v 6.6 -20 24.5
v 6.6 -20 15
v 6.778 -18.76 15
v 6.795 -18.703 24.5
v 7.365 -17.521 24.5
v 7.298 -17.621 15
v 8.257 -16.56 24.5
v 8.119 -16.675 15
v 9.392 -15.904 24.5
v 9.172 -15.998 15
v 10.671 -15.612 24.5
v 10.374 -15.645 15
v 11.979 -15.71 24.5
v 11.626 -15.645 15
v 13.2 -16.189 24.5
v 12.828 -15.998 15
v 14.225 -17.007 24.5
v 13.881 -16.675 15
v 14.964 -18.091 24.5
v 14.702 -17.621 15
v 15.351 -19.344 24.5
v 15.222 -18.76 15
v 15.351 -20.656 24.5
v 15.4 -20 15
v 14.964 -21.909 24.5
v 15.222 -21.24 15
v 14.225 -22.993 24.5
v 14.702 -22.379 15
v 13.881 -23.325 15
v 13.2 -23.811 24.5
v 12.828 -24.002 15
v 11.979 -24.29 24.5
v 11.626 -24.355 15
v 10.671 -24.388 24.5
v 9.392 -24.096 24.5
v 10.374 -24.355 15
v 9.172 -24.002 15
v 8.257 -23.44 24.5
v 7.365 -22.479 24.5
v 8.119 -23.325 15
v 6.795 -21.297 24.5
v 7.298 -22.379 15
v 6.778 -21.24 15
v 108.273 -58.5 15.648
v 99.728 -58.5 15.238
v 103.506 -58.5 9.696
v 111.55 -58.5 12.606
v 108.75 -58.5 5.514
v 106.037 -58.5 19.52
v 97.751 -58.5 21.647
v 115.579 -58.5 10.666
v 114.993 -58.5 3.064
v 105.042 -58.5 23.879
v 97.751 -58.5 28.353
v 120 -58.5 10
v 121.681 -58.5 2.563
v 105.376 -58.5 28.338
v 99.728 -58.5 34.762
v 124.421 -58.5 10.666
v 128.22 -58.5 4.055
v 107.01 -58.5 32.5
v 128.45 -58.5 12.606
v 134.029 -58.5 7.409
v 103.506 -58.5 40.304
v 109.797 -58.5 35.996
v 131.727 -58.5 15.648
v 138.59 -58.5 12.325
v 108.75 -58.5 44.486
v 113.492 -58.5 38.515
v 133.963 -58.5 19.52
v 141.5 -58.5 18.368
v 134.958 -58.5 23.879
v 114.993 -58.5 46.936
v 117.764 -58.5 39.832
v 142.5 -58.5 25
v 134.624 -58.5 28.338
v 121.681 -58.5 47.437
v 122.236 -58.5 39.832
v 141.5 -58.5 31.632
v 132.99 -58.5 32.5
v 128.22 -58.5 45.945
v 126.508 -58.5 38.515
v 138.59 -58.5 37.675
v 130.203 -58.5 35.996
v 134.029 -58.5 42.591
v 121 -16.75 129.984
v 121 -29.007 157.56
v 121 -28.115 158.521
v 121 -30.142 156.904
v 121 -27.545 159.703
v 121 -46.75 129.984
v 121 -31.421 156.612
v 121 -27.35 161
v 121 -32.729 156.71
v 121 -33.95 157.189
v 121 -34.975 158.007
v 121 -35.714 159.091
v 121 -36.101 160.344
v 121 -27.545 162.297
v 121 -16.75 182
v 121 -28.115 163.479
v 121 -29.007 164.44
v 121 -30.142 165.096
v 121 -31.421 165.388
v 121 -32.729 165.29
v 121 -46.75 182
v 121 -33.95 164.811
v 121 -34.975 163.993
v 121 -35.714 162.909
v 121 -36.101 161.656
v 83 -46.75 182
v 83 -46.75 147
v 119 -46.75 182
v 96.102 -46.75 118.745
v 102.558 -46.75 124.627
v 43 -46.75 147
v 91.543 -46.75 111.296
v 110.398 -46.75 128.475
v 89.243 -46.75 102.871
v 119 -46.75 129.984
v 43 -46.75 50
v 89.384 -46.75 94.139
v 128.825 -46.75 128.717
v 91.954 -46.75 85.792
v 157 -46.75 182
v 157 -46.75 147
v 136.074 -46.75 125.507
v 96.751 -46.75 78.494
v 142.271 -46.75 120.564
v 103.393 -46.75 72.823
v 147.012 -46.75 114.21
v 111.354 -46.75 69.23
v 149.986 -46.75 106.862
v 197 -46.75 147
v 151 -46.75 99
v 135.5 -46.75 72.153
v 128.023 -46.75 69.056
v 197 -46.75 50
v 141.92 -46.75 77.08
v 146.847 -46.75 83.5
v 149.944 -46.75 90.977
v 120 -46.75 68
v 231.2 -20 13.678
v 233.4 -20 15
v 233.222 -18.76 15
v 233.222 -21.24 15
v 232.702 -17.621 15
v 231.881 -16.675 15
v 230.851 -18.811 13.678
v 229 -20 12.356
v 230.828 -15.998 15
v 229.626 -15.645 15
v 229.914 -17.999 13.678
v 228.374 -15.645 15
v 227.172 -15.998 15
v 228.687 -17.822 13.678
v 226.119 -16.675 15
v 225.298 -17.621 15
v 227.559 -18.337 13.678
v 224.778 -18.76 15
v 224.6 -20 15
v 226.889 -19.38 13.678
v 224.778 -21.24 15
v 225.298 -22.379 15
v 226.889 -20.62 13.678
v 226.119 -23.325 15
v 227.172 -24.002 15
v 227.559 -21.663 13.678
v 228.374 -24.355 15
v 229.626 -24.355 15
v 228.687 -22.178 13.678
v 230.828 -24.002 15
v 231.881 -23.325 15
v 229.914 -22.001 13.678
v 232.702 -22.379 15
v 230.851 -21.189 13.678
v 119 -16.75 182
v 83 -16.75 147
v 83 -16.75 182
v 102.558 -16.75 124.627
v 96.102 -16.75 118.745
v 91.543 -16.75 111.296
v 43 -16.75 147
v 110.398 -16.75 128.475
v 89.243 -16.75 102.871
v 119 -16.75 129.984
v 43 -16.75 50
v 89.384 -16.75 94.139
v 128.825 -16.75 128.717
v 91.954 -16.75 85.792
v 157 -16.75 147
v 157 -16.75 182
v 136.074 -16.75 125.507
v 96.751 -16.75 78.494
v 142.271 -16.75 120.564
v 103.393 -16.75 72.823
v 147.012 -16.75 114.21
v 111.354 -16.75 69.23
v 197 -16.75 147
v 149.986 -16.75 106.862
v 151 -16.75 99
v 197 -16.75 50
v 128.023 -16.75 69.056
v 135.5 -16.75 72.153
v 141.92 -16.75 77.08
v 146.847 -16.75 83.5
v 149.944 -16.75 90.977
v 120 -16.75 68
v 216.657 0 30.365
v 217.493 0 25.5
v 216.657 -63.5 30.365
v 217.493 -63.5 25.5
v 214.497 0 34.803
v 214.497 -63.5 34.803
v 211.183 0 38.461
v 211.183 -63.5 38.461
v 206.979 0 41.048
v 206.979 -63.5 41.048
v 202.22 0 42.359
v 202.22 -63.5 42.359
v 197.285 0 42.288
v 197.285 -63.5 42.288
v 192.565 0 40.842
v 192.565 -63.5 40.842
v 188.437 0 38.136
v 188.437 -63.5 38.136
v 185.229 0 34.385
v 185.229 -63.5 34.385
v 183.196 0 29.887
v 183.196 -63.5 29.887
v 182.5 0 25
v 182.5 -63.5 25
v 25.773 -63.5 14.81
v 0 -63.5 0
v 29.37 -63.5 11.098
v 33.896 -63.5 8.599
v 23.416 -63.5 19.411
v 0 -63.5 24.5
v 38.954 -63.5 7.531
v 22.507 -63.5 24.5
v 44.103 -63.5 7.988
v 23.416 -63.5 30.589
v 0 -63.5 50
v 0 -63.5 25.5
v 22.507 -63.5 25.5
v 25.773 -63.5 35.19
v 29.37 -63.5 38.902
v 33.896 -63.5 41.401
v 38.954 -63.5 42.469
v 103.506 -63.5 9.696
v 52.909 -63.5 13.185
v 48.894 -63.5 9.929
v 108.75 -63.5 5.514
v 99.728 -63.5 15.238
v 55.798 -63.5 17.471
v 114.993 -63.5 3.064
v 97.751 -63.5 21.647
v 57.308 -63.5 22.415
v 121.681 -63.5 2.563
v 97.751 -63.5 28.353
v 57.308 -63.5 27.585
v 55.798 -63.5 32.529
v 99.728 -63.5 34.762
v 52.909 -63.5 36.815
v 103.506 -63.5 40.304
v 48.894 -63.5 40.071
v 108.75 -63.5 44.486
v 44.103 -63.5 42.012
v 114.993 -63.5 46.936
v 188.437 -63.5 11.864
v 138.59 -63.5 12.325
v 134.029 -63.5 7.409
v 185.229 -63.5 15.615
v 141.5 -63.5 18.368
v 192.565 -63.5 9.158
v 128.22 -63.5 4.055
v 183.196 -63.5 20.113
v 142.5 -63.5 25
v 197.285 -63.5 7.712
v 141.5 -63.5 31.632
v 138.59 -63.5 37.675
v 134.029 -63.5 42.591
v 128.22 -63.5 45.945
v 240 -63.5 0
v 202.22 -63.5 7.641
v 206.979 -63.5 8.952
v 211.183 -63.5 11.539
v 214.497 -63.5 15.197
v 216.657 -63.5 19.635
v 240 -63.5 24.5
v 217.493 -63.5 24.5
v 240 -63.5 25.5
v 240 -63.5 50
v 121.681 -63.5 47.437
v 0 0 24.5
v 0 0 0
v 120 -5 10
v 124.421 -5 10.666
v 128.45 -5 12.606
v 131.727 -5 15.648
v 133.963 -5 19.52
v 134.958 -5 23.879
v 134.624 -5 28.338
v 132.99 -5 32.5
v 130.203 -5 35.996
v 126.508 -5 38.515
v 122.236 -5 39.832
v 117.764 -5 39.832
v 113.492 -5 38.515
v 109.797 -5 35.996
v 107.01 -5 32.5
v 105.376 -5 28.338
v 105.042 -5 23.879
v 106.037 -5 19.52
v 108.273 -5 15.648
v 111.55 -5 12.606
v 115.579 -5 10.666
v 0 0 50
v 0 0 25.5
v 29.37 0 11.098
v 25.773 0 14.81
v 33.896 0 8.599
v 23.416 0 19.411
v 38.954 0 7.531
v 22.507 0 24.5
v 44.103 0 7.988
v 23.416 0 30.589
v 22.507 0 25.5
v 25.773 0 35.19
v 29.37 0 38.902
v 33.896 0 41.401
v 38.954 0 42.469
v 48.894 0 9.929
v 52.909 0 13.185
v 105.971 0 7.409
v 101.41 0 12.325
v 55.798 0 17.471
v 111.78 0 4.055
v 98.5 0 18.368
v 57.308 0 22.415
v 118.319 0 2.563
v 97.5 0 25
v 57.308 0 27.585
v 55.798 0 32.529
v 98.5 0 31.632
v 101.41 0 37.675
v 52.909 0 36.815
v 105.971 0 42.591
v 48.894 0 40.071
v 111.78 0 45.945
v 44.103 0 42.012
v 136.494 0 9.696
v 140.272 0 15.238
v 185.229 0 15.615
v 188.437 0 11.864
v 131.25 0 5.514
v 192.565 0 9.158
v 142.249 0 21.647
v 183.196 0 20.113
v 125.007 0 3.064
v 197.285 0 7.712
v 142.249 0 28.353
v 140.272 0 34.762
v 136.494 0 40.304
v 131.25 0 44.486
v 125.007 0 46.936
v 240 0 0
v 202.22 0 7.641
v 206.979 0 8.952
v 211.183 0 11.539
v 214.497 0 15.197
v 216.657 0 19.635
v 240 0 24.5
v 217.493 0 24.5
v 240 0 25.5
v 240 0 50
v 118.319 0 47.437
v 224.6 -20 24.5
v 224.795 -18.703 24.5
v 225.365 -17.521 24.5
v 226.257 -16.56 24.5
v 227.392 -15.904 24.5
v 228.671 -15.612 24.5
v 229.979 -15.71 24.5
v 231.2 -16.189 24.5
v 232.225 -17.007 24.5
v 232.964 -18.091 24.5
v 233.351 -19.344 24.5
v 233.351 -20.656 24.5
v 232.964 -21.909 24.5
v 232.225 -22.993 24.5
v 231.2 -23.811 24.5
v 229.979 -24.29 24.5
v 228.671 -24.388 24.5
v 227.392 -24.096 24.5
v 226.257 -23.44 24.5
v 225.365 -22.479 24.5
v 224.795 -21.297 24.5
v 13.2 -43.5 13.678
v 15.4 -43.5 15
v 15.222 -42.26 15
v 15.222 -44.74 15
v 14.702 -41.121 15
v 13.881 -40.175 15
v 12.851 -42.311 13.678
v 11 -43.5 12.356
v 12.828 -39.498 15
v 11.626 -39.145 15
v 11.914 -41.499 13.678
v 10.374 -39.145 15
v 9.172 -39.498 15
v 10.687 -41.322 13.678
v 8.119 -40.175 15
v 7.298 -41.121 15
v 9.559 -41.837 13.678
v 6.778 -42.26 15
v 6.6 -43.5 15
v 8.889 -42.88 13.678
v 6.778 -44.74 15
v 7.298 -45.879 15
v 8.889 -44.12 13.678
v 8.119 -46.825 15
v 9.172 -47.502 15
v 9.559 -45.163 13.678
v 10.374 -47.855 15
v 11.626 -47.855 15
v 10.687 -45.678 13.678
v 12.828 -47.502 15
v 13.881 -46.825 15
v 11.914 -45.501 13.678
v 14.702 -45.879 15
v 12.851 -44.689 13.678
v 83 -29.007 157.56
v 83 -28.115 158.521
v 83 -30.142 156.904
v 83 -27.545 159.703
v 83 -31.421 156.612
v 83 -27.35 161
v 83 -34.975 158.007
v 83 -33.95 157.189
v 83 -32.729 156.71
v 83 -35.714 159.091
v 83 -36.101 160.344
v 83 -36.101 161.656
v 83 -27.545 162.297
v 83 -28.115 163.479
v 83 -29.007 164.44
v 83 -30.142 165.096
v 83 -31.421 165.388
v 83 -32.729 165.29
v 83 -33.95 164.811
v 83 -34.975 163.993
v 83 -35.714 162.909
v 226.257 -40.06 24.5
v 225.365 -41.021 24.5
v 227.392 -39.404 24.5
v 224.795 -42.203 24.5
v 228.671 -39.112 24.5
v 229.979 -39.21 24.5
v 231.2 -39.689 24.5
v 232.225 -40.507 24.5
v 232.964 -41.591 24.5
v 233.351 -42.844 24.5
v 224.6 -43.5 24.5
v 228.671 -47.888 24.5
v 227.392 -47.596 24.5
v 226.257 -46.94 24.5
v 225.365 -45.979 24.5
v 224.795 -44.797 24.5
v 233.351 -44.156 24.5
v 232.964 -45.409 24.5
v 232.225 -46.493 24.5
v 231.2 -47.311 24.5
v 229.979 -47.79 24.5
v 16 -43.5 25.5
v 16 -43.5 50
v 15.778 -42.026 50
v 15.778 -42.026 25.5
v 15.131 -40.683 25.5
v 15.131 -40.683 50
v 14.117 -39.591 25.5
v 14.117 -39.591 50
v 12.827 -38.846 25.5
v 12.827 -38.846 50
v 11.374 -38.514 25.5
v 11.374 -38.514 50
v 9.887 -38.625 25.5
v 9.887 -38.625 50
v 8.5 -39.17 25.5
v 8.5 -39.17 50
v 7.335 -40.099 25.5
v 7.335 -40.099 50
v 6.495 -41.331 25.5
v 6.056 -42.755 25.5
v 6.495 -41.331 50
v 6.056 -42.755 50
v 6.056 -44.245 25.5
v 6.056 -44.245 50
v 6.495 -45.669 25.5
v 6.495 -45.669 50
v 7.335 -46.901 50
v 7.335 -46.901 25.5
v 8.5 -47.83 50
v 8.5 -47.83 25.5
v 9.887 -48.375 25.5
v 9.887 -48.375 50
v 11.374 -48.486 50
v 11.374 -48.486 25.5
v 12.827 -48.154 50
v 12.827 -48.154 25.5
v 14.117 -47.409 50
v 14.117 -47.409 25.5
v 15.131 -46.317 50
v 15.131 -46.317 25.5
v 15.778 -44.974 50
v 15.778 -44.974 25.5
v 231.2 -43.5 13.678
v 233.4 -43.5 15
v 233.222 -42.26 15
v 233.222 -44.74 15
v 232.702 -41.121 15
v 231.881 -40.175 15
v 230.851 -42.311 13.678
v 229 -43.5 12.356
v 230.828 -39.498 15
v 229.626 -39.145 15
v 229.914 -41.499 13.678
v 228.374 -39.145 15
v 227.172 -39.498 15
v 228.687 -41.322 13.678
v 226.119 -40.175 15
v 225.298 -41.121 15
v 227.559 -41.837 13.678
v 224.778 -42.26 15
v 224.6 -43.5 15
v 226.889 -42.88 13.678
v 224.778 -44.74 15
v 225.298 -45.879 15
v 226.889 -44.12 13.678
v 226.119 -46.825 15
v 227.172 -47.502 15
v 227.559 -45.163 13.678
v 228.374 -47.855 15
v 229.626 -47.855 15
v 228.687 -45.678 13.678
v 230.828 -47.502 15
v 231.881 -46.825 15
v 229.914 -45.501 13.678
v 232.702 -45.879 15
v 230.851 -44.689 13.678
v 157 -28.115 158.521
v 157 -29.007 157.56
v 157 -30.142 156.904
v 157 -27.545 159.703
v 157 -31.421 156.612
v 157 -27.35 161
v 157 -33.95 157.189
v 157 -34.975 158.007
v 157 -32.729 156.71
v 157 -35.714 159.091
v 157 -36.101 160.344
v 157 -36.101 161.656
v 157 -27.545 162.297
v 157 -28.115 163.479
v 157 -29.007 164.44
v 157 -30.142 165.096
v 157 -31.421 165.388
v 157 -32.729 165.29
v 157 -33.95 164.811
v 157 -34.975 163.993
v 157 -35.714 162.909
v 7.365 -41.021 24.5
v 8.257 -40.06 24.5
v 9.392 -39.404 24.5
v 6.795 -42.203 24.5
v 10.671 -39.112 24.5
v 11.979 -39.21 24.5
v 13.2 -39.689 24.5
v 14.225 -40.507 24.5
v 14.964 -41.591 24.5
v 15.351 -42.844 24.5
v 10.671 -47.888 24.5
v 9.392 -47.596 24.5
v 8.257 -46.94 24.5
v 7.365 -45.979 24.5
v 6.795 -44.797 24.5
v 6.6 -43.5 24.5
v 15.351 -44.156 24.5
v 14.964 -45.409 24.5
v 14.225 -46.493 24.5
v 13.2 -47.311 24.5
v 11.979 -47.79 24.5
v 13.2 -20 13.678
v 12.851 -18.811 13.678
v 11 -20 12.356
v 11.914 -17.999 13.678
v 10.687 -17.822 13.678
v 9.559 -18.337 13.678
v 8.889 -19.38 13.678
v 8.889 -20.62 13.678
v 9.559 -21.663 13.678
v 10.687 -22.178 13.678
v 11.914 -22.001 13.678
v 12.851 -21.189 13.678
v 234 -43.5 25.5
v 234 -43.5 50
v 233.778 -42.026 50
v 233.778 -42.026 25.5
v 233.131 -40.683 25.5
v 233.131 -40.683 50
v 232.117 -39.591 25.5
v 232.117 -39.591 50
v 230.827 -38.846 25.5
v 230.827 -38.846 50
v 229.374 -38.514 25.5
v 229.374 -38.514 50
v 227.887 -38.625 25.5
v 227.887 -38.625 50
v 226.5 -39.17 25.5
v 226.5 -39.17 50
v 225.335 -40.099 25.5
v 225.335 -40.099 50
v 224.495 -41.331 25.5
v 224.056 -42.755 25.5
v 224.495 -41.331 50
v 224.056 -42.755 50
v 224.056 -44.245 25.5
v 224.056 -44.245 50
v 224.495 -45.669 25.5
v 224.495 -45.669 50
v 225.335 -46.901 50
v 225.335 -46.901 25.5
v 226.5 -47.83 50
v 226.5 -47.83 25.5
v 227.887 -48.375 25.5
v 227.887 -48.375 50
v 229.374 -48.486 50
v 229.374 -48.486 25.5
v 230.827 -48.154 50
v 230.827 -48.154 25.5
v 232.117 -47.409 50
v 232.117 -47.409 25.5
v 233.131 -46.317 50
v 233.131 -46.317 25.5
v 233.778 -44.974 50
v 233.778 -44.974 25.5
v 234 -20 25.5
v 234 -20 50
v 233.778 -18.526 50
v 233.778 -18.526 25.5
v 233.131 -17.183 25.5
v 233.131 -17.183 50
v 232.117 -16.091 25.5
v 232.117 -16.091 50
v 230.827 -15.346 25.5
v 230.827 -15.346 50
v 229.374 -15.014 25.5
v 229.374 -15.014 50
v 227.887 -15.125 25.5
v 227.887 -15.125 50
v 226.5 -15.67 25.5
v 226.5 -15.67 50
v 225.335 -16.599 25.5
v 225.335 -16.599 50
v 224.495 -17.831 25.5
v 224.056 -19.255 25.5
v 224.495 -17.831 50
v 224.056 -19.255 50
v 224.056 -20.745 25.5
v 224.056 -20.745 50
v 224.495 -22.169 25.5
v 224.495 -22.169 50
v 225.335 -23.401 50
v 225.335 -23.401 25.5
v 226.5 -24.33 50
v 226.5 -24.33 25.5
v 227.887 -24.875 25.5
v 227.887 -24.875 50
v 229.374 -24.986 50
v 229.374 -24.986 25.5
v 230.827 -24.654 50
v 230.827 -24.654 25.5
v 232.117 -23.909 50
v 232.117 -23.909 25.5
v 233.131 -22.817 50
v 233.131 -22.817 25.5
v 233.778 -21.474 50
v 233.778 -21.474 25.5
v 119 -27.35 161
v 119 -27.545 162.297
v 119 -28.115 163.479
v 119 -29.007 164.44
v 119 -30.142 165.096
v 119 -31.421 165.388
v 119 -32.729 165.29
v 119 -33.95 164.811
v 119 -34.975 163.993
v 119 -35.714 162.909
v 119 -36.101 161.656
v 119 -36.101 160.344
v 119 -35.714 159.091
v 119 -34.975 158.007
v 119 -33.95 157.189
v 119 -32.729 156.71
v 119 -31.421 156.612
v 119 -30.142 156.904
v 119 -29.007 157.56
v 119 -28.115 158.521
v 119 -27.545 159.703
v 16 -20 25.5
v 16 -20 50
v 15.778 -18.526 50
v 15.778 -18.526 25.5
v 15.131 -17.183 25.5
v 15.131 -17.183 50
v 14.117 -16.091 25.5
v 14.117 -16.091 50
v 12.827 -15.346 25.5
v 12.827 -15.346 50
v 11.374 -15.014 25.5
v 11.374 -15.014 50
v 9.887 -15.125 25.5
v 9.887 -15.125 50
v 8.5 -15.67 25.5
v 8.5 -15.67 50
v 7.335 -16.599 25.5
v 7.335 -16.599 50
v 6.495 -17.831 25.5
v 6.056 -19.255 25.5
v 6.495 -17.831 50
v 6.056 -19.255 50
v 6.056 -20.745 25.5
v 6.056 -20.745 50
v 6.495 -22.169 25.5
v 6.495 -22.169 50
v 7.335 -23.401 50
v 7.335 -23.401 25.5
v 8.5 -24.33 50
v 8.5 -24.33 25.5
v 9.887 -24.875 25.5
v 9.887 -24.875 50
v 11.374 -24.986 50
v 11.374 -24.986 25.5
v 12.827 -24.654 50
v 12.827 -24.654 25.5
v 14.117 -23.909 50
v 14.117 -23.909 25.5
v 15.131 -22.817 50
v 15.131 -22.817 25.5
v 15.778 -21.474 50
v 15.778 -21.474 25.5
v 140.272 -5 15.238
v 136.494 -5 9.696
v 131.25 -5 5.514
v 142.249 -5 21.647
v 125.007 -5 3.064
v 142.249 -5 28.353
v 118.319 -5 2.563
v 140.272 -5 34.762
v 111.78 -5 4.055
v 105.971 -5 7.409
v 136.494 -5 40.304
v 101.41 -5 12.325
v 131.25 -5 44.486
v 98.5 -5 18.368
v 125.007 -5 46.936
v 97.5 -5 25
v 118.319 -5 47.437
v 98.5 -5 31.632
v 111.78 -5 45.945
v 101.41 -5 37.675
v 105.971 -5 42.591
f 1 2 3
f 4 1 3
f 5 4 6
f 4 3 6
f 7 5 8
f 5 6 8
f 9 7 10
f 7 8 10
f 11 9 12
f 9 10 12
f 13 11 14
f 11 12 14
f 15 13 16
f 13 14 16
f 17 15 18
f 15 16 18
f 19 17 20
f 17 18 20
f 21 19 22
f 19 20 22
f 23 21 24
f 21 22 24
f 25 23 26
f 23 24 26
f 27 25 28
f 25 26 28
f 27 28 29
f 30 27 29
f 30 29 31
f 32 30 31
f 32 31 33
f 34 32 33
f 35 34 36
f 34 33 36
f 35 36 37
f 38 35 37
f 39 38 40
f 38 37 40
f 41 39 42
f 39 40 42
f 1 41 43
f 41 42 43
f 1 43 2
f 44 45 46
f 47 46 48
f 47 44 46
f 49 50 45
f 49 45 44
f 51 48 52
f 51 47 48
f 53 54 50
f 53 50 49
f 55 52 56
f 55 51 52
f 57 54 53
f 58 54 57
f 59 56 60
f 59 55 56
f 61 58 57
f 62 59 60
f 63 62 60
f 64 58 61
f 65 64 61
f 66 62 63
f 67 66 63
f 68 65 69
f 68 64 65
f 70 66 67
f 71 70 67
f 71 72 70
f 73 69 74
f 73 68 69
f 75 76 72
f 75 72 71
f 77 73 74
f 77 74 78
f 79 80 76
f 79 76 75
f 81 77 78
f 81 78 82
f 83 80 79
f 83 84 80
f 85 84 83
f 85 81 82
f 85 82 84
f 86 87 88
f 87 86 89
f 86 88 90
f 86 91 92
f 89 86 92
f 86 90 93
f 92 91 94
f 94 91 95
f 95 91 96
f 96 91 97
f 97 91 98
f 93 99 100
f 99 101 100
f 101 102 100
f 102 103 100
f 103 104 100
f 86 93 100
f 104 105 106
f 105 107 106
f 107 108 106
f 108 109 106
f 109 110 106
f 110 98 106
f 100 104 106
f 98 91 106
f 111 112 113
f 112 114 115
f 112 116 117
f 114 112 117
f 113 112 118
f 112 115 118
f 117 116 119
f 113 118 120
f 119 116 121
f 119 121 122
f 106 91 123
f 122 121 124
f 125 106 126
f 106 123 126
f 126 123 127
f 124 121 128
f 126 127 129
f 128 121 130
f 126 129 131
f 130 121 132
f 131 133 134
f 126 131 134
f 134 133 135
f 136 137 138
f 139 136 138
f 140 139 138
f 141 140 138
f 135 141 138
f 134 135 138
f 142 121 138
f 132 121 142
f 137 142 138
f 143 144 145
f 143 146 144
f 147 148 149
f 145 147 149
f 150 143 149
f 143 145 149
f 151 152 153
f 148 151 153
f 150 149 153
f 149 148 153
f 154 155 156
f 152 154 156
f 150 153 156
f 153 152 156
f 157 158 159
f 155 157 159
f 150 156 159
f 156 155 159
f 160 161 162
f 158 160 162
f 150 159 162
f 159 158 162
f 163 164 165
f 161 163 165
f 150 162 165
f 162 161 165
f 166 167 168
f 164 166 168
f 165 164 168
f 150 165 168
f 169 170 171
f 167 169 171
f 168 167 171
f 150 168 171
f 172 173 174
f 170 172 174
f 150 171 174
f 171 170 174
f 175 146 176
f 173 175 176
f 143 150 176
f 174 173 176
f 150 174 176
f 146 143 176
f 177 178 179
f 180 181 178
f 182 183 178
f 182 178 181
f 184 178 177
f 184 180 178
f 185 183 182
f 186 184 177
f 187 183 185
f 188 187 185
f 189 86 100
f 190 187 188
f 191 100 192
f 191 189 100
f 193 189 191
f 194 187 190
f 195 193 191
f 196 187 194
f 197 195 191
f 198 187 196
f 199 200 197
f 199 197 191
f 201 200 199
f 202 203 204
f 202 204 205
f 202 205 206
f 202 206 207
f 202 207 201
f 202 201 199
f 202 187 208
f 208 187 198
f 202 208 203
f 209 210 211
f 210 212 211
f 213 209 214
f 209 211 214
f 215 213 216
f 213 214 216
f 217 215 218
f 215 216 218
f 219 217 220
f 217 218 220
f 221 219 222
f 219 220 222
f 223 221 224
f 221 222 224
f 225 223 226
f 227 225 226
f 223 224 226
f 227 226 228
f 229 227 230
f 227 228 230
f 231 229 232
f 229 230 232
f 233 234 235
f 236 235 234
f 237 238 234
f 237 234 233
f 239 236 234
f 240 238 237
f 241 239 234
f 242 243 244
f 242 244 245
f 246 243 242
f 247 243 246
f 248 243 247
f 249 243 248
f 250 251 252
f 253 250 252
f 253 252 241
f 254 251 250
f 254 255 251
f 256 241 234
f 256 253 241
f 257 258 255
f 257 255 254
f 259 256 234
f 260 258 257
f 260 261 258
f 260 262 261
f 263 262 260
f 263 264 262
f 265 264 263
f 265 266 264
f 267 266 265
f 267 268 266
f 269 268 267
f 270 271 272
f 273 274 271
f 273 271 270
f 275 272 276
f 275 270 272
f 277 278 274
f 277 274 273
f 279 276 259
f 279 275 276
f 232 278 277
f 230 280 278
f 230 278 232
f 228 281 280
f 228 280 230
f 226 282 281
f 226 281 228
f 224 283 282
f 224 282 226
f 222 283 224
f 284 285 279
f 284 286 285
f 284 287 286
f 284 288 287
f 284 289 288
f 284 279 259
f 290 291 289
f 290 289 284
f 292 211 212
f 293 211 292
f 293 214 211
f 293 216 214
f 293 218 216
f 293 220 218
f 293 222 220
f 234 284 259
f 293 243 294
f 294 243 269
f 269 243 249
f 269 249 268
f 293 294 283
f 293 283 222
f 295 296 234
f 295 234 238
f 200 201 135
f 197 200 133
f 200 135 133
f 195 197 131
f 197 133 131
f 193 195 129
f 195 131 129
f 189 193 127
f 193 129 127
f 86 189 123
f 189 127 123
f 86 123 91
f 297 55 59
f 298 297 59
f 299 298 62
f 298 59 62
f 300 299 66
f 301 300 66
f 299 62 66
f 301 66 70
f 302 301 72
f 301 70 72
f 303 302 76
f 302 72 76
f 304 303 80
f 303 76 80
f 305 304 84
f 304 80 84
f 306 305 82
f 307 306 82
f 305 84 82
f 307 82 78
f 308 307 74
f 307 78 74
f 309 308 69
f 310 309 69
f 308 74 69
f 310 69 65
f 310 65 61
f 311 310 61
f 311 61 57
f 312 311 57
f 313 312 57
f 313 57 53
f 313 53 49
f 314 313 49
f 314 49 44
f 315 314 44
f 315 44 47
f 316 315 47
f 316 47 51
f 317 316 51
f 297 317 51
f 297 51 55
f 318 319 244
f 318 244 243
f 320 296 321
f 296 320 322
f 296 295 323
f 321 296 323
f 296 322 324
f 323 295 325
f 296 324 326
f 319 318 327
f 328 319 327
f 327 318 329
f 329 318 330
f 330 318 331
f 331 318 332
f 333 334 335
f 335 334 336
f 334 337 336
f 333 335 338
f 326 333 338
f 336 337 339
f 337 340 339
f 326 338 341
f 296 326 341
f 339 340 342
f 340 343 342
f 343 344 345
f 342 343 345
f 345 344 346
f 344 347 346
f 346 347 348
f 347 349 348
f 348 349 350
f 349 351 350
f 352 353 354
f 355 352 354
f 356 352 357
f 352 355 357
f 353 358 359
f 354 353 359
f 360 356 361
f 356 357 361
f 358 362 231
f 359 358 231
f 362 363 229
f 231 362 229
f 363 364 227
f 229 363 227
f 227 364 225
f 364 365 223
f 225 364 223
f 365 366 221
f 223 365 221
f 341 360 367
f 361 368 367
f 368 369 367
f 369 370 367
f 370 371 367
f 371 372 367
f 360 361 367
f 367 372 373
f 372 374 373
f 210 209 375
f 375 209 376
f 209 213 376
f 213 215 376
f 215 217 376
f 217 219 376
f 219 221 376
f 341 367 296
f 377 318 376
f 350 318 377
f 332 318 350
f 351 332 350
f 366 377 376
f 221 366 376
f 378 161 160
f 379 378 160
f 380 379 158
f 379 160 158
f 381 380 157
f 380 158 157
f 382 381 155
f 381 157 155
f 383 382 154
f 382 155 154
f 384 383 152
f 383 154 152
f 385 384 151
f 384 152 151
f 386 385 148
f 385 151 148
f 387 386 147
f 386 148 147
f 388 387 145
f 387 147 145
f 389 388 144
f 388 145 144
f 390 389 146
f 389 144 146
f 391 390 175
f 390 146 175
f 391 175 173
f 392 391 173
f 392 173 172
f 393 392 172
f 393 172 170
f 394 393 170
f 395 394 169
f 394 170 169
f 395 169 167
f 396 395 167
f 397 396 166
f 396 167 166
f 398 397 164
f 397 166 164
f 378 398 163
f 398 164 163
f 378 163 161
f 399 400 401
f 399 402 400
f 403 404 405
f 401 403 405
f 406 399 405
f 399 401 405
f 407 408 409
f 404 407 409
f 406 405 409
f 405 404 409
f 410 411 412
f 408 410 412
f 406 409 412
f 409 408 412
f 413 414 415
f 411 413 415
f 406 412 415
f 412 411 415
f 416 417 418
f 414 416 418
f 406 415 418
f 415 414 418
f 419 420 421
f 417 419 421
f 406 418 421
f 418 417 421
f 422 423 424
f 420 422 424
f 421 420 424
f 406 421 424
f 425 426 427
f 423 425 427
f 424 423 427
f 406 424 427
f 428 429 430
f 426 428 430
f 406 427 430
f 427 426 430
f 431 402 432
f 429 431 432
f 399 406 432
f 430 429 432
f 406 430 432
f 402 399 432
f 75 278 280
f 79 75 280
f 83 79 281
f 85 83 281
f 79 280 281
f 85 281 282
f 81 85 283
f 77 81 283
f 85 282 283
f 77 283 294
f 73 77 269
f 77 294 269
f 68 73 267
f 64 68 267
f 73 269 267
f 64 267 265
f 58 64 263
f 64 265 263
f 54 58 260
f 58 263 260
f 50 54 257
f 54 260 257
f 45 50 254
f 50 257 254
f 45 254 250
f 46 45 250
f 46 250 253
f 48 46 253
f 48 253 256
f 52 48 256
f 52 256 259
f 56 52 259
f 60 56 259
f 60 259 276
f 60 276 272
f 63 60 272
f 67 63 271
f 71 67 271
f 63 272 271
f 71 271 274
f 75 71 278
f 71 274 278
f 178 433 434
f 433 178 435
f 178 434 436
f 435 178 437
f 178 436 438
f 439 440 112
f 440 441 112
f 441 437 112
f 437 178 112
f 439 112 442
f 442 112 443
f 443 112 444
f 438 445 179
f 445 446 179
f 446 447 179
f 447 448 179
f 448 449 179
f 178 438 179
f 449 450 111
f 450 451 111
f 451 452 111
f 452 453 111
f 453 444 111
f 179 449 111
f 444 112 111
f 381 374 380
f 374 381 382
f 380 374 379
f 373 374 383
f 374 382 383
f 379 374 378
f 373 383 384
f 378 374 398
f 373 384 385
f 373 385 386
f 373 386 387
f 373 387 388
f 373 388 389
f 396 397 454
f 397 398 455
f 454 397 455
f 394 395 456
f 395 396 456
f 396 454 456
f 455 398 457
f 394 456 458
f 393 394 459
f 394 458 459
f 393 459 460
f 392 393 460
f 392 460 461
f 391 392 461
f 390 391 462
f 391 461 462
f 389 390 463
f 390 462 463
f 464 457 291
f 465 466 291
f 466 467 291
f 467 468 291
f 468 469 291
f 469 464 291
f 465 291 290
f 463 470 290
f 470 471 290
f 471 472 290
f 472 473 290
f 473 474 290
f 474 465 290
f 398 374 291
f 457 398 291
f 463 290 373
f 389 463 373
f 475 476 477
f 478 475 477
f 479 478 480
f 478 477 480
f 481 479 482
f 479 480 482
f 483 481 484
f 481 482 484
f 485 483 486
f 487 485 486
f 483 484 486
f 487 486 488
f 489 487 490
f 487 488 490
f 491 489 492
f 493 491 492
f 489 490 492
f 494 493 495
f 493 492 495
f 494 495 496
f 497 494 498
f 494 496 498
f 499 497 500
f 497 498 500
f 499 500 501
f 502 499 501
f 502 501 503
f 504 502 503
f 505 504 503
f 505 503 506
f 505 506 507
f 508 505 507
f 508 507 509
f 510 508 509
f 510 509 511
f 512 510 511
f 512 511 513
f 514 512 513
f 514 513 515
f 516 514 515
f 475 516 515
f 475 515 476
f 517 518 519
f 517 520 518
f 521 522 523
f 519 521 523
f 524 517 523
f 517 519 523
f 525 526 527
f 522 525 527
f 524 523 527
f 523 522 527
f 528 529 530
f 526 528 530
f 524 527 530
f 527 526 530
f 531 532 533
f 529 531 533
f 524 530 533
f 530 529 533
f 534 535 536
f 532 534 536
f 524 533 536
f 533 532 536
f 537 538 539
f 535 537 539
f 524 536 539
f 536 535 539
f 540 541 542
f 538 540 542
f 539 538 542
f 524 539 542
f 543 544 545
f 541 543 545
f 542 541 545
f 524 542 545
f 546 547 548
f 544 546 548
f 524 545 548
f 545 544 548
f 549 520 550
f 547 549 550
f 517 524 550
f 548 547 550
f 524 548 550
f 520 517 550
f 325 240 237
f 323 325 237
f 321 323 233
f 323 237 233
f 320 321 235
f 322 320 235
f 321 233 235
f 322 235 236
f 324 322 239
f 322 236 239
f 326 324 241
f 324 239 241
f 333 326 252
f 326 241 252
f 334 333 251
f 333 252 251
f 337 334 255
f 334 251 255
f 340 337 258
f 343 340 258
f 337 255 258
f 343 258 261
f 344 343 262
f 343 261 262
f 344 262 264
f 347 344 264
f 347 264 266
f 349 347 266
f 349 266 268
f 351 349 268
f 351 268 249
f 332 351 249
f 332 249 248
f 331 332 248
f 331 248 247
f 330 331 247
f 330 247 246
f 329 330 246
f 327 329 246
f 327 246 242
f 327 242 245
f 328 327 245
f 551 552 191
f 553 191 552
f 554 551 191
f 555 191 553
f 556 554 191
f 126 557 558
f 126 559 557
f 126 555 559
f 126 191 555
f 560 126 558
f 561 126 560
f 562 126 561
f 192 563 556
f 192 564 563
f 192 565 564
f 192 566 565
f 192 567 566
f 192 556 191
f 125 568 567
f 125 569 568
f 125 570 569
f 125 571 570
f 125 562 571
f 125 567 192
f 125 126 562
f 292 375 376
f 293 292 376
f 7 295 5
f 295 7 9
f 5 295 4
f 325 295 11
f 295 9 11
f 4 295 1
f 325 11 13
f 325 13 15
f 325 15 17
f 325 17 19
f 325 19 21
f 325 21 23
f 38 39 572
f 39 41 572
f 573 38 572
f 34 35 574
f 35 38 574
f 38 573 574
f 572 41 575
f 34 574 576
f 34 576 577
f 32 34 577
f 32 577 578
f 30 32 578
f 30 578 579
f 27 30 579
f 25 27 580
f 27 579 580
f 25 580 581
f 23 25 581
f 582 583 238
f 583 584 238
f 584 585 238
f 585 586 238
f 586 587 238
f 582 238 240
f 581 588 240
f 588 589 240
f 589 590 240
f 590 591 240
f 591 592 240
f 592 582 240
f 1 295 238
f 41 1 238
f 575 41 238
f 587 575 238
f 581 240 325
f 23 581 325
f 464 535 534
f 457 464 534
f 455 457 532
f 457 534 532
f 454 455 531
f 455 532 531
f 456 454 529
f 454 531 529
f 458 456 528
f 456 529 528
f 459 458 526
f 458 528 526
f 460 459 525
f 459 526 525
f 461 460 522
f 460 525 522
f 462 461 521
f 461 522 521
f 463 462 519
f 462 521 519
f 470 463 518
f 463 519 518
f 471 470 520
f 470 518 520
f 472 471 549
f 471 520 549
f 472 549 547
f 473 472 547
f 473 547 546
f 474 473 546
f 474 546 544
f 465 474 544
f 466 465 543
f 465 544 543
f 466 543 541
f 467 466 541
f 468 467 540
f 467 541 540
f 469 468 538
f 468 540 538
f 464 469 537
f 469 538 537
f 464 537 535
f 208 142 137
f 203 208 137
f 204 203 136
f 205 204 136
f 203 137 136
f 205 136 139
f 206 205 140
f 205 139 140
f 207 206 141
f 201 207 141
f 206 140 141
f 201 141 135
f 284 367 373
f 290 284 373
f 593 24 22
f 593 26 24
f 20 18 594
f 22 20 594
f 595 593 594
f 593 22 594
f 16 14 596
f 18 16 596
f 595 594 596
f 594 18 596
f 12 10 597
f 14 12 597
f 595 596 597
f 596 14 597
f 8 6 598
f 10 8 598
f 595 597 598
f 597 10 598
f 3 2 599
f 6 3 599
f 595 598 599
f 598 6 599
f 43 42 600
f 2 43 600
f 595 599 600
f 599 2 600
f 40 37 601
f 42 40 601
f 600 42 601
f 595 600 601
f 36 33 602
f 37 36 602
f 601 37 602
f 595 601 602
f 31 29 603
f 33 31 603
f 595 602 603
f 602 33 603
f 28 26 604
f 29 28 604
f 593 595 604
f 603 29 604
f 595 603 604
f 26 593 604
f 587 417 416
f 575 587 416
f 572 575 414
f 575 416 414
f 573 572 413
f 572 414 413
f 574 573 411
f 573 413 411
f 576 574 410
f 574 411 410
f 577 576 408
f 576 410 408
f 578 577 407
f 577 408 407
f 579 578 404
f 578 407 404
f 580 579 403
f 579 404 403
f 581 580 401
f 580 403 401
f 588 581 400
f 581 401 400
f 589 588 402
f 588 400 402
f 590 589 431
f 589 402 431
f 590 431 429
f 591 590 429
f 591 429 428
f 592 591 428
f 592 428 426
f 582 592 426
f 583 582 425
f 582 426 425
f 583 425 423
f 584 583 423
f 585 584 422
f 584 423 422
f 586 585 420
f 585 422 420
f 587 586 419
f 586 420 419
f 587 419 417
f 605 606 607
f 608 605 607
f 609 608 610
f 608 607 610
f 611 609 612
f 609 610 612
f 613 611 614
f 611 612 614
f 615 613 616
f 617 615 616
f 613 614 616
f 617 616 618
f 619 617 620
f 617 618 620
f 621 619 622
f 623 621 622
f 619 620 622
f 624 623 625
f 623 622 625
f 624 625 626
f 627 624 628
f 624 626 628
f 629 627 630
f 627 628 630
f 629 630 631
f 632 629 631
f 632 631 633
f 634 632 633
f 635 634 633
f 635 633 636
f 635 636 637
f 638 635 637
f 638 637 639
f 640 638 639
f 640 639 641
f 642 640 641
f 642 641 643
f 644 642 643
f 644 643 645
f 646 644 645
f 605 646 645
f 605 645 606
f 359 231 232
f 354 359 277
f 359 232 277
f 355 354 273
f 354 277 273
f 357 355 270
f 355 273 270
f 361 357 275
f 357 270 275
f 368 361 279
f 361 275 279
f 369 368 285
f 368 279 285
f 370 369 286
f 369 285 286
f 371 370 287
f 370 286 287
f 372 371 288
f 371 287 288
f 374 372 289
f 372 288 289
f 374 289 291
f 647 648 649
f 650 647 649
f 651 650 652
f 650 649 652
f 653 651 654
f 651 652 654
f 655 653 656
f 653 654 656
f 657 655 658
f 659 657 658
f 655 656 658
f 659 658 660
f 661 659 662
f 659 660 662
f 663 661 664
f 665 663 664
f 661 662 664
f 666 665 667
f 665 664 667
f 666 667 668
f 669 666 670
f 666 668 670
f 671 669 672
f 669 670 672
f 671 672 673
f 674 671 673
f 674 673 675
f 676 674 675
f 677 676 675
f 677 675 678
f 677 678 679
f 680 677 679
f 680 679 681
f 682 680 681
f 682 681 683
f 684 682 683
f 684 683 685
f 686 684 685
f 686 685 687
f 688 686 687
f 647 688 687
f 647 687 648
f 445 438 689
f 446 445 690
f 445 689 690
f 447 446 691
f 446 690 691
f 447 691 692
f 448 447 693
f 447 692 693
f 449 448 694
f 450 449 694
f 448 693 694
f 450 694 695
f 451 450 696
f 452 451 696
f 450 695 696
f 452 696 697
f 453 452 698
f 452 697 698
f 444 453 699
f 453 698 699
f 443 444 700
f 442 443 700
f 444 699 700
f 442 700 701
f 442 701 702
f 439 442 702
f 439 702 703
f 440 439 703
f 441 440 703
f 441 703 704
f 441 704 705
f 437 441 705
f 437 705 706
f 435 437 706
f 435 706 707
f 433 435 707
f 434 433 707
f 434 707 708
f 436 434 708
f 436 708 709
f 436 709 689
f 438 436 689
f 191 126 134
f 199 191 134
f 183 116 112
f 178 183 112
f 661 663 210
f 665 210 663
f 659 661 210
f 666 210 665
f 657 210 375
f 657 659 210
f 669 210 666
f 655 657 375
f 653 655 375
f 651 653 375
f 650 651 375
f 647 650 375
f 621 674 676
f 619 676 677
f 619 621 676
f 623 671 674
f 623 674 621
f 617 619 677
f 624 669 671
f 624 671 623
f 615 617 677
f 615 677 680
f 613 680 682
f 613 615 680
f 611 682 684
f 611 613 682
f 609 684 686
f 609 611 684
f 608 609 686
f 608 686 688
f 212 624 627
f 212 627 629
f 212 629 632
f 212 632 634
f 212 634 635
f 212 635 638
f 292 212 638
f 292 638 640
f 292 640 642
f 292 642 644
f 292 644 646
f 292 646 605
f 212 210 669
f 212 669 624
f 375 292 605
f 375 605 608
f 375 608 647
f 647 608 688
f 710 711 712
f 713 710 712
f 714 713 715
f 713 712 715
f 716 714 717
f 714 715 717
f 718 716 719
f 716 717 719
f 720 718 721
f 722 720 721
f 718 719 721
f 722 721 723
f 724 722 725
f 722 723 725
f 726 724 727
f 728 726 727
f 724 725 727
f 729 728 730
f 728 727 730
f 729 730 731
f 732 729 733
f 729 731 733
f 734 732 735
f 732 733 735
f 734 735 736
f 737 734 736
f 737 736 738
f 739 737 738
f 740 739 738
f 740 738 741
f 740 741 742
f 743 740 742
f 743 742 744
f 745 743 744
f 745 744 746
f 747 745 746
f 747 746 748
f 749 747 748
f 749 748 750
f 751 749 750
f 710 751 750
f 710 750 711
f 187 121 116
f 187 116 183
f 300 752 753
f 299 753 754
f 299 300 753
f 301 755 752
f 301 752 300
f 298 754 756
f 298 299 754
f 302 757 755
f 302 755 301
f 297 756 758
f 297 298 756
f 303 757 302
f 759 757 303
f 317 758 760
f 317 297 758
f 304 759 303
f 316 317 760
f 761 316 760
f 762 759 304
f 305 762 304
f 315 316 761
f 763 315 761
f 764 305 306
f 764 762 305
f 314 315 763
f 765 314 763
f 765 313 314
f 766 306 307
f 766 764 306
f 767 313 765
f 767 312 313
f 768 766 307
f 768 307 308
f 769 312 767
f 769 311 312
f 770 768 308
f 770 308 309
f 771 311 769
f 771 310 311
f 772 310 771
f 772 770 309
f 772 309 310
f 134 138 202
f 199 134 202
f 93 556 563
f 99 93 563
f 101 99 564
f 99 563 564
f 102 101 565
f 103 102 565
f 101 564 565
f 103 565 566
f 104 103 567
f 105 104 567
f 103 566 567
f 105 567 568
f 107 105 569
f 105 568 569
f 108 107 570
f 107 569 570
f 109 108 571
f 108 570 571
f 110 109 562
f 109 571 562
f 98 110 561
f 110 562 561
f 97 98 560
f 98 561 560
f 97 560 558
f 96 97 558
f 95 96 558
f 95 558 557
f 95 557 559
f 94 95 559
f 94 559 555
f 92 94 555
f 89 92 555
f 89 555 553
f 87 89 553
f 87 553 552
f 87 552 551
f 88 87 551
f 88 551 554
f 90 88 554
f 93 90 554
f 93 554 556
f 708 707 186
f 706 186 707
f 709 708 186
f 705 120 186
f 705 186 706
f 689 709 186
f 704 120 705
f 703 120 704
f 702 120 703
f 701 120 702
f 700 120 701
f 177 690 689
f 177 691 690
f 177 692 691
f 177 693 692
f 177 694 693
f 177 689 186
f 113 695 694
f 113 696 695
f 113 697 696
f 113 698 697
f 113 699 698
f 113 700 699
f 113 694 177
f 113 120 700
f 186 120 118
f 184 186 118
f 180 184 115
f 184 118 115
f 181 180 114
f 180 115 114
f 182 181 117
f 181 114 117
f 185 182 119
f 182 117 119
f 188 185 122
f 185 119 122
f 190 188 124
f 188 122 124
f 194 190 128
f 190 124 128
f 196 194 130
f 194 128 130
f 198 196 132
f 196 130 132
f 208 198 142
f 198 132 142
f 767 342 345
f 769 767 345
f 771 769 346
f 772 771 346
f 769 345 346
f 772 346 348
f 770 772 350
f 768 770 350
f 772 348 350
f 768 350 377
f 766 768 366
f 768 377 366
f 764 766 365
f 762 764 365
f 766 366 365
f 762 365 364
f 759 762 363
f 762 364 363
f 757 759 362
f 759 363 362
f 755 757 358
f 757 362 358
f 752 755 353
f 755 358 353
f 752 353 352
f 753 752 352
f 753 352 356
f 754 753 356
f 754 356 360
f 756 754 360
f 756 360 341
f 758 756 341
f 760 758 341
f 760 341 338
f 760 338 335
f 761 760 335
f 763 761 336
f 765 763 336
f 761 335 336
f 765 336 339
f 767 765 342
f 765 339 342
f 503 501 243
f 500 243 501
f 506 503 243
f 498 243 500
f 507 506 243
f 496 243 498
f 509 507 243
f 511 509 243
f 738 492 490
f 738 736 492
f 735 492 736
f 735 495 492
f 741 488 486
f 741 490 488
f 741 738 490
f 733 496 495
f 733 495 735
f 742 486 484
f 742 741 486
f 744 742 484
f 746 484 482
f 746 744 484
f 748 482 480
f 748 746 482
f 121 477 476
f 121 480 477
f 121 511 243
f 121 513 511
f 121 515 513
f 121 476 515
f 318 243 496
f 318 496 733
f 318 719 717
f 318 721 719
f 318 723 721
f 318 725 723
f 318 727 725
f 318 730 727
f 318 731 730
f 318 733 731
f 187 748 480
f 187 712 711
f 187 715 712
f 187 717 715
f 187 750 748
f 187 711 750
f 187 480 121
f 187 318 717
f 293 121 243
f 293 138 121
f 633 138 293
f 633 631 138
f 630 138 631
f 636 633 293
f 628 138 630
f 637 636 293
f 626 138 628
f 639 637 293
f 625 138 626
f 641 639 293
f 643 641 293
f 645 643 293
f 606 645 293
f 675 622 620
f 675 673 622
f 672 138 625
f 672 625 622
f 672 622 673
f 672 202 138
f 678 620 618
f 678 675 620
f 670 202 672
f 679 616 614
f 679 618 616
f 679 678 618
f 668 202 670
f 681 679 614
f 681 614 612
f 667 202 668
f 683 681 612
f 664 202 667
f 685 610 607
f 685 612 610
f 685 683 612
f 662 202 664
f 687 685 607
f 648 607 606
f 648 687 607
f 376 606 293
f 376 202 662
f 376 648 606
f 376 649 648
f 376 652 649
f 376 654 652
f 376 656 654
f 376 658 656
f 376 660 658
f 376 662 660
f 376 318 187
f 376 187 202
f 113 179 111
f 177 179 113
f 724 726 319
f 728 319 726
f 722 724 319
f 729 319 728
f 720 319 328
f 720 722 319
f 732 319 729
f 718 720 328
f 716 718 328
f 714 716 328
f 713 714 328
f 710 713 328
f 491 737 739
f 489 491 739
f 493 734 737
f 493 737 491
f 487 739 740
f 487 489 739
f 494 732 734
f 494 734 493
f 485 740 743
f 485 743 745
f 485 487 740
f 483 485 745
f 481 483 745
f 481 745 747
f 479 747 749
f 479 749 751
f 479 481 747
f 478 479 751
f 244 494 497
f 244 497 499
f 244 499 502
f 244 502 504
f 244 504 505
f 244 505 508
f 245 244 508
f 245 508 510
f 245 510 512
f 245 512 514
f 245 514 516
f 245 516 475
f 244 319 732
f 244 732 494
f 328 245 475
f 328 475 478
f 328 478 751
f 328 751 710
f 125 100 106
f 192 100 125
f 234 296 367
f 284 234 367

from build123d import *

# Parameters (mm, degrees)
F0_W            = 240
F0_H            = 50
F1_DEPTH        = 63.5
F3_DEPTH        = 63.501
F4_R            = 22.5
F5_DEPTH        = 5
F6_R            = 22.5
F7_DEPTH        = 5
F8_W            = 33.4643870592
F8_H            = 0.5
F8_W_2          = 31.9364720583
F9_DEPTH        = 63.501
F11_D           = 8.8
F11_DEPTH       = 35
F11_CBORE_D     = 10
F11_CBORE_DEPTH = 25
F11_TIP         = 2.6437867237
F12_W           = 154
F12_H           = 30
F13_DEPTH       = 132
F15_DEPTH       = 63.501
F16_W           = 1
F16_H           = 104.974
F17_DEPTH       = 46.751
F18_W           = 40
F18_H           = 35
F19_DEPTH       = 46.751
F21_D           = 8.8
F21_DEPTH       = 93
F21_TIP         = 2.6437867237


with BuildPart() as f1:
    # F0 (on Front) → F1 (new body)
    with BuildSketch(Plane.XZ):
        with Locations((120, 25)):
            Rectangle(F0_W, F0_H)
    extrude(amount=F1_DEPTH)

    # F2 (on face) → F3 (cut, through all)
    with BuildSketch(Plane.XZ.offset(63.5)):
        with BuildLine():
            Line((22.5, 25), (40, 25))
            Line((40, 25), (57.5, 25))
            ThreePointArc((57.5, 25), (40, 42.5), (22.5, 25))
        make_face()
        with BuildLine():
            Line((57.5, 25), (40, 25))
            Line((40, 25), (22.5, 25))
            ThreePointArc((22.5, 25), (40, 7.5), (57.5, 25))
        make_face()
        with BuildLine():
            ThreePointArc((217.5, 25), (200, 42.5), (182.5, 25))
            Line((182.5, 25), (200, 25))
            Line((200, 25), (217.5, 25))
        make_face()
        with BuildLine():
            Line((200, 25), (182.5, 25))
            ThreePointArc((182.5, 25), (200, 7.5), (217.5, 25))
            Line((217.5, 25), (200, 25))
        make_face()
        with BuildLine():
            ThreePointArc((120, 40), (109.3933982822, 35.6066017178), (105, 25))
            Line((105, 25), (120, 25))
            Line((120, 25), (120, 40))
        make_face()
        with BuildLine():
            Line((120, 25), (105, 25))
            ThreePointArc((105, 25), (109.3933982822, 14.3933982822), (120, 10))
            Line((120, 10), (120, 25))
        make_face()
        with BuildLine():
            Line((120, 40), (120, 25))
            Line((120, 25), (135, 25))
            ThreePointArc((135, 25), (130.6066017178, 35.6066017178), (120, 40))
        make_face()
        with BuildLine():
            Line((135, 25), (120, 25))
            Line((120, 25), (120, 10))
            ThreePointArc((120, 10), (130.6066017178, 14.3933982822), (135, 25))
        make_face()
    extrude(amount=-F3_DEPTH, mode=Mode.SUBTRACT)

    # F4 (on face) → F5 (cut)
    with BuildSketch(Plane.XZ.offset(63.5)):
        with Locations((120, 25)):
            Circle(F4_R)
    extrude(amount=-F5_DEPTH, mode=Mode.SUBTRACT)

    # F6 (on face) → F7 (cut)
    with BuildSketch(Plane(origin=(0, 0, 0), x_dir=(-1, 0, 0), z_dir=(0, 1, 0))):
        with Locations((-120, 25)):
            Circle(F6_R)
    extrude(amount=-F7_DEPTH, mode=Mode.SUBTRACT)

    # F8 (on face) → F9 (cut, through all)
    with BuildSketch(Plane.XZ.offset(63.5)):
        with Locations((16.7321935296, 25.25)):
            Rectangle(F8_W, F8_H)
        with Locations((16.7321935296, 24.75)):
            Rectangle(F8_W, F8_H)
        with Locations((224.0317639709, 24.75)):
            Rectangle(F8_W_2, F8_H)
        with Locations((224.0317639709, 25.25)):
            Rectangle(F8_W_2, F8_H)
    extrude(amount=-F9_DEPTH, mode=Mode.SUBTRACT)

    # F11
    with Locations(Plane.XY.offset(50)):
        with Locations((11, -20), (11, -43.5), (229, -20), (229, -43.5)):
            CounterBoreHole(F11_D / 2, F11_CBORE_D / 2, F11_CBORE_DEPTH, depth=F11_DEPTH)
            with Locations((0, 0, -(F11_DEPTH + F11_TIP / 2))):  # 118° drill point
                Cone(0, F11_D / 2, F11_TIP, mode=Mode.SUBTRACT)

    # F12 (on face) → F13 (join)
    with BuildSketch(Plane.XY.offset(50)):
        with Locations((120, -31.75)):
            Rectangle(F12_W, F12_H)
    extrude(amount=F13_DEPTH)

    # F14 (on face) → F15 (cut, through all)
    with BuildSketch(Plane.XZ.offset(63.5)):
        with BuildLine():
            ThreePointArc((120, 68), (141.9203102168, 77.0796897832), (151, 99))
            ThreePointArc((151, 99), (98.0796897832, 120.9203102168), (120, 68))
        make_face()
        with BuildLine():
            ThreePointArc((151, 99), (98.0796897832, 120.9203102168), (120, 68))
            ThreePointArc((120, 68), (141.9203102168, 77.0796897832), (151, 99))
        make_face()
    extrude(amount=-F15_DEPTH, mode=Mode.SUBTRACT)

    # F16 (on face) → F17 (cut, through all)
    with BuildSketch(Plane.XZ.offset(46.75)):
        with Locations((119.5, 151.487)):
            Rectangle(F16_W, F16_H)
        with Locations((120.5, 151.487)):
            Rectangle(F16_W, F16_H)
    extrude(amount=-F17_DEPTH, mode=Mode.SUBTRACT)

    # F18 (on face) → F19 (cut, through all)
    with BuildSketch(Plane.XZ.offset(46.75)):
        with Locations((63, 164.5)):
            Rectangle(F18_W, F18_H)
        with Locations((177, 164.5)):
            Rectangle(F18_W, F18_H)
    extrude(amount=-F19_DEPTH, mode=Mode.SUBTRACT)

    # F21
    with Locations(Plane(origin=(83, 0, 0), x_dir=(0, -1, 0), z_dir=(-1, 0, 0))):
        with Locations((31.75, 160.9999984503)):
            Hole(F21_D / 2, depth=F21_DEPTH)
            with Locations((0, 0, -(F21_DEPTH + F21_TIP / 2))):  # 118° drill point
                Cone(0, F21_D / 2, F21_TIP, mode=Mode.SUBTRACT)


solid = f1.part
